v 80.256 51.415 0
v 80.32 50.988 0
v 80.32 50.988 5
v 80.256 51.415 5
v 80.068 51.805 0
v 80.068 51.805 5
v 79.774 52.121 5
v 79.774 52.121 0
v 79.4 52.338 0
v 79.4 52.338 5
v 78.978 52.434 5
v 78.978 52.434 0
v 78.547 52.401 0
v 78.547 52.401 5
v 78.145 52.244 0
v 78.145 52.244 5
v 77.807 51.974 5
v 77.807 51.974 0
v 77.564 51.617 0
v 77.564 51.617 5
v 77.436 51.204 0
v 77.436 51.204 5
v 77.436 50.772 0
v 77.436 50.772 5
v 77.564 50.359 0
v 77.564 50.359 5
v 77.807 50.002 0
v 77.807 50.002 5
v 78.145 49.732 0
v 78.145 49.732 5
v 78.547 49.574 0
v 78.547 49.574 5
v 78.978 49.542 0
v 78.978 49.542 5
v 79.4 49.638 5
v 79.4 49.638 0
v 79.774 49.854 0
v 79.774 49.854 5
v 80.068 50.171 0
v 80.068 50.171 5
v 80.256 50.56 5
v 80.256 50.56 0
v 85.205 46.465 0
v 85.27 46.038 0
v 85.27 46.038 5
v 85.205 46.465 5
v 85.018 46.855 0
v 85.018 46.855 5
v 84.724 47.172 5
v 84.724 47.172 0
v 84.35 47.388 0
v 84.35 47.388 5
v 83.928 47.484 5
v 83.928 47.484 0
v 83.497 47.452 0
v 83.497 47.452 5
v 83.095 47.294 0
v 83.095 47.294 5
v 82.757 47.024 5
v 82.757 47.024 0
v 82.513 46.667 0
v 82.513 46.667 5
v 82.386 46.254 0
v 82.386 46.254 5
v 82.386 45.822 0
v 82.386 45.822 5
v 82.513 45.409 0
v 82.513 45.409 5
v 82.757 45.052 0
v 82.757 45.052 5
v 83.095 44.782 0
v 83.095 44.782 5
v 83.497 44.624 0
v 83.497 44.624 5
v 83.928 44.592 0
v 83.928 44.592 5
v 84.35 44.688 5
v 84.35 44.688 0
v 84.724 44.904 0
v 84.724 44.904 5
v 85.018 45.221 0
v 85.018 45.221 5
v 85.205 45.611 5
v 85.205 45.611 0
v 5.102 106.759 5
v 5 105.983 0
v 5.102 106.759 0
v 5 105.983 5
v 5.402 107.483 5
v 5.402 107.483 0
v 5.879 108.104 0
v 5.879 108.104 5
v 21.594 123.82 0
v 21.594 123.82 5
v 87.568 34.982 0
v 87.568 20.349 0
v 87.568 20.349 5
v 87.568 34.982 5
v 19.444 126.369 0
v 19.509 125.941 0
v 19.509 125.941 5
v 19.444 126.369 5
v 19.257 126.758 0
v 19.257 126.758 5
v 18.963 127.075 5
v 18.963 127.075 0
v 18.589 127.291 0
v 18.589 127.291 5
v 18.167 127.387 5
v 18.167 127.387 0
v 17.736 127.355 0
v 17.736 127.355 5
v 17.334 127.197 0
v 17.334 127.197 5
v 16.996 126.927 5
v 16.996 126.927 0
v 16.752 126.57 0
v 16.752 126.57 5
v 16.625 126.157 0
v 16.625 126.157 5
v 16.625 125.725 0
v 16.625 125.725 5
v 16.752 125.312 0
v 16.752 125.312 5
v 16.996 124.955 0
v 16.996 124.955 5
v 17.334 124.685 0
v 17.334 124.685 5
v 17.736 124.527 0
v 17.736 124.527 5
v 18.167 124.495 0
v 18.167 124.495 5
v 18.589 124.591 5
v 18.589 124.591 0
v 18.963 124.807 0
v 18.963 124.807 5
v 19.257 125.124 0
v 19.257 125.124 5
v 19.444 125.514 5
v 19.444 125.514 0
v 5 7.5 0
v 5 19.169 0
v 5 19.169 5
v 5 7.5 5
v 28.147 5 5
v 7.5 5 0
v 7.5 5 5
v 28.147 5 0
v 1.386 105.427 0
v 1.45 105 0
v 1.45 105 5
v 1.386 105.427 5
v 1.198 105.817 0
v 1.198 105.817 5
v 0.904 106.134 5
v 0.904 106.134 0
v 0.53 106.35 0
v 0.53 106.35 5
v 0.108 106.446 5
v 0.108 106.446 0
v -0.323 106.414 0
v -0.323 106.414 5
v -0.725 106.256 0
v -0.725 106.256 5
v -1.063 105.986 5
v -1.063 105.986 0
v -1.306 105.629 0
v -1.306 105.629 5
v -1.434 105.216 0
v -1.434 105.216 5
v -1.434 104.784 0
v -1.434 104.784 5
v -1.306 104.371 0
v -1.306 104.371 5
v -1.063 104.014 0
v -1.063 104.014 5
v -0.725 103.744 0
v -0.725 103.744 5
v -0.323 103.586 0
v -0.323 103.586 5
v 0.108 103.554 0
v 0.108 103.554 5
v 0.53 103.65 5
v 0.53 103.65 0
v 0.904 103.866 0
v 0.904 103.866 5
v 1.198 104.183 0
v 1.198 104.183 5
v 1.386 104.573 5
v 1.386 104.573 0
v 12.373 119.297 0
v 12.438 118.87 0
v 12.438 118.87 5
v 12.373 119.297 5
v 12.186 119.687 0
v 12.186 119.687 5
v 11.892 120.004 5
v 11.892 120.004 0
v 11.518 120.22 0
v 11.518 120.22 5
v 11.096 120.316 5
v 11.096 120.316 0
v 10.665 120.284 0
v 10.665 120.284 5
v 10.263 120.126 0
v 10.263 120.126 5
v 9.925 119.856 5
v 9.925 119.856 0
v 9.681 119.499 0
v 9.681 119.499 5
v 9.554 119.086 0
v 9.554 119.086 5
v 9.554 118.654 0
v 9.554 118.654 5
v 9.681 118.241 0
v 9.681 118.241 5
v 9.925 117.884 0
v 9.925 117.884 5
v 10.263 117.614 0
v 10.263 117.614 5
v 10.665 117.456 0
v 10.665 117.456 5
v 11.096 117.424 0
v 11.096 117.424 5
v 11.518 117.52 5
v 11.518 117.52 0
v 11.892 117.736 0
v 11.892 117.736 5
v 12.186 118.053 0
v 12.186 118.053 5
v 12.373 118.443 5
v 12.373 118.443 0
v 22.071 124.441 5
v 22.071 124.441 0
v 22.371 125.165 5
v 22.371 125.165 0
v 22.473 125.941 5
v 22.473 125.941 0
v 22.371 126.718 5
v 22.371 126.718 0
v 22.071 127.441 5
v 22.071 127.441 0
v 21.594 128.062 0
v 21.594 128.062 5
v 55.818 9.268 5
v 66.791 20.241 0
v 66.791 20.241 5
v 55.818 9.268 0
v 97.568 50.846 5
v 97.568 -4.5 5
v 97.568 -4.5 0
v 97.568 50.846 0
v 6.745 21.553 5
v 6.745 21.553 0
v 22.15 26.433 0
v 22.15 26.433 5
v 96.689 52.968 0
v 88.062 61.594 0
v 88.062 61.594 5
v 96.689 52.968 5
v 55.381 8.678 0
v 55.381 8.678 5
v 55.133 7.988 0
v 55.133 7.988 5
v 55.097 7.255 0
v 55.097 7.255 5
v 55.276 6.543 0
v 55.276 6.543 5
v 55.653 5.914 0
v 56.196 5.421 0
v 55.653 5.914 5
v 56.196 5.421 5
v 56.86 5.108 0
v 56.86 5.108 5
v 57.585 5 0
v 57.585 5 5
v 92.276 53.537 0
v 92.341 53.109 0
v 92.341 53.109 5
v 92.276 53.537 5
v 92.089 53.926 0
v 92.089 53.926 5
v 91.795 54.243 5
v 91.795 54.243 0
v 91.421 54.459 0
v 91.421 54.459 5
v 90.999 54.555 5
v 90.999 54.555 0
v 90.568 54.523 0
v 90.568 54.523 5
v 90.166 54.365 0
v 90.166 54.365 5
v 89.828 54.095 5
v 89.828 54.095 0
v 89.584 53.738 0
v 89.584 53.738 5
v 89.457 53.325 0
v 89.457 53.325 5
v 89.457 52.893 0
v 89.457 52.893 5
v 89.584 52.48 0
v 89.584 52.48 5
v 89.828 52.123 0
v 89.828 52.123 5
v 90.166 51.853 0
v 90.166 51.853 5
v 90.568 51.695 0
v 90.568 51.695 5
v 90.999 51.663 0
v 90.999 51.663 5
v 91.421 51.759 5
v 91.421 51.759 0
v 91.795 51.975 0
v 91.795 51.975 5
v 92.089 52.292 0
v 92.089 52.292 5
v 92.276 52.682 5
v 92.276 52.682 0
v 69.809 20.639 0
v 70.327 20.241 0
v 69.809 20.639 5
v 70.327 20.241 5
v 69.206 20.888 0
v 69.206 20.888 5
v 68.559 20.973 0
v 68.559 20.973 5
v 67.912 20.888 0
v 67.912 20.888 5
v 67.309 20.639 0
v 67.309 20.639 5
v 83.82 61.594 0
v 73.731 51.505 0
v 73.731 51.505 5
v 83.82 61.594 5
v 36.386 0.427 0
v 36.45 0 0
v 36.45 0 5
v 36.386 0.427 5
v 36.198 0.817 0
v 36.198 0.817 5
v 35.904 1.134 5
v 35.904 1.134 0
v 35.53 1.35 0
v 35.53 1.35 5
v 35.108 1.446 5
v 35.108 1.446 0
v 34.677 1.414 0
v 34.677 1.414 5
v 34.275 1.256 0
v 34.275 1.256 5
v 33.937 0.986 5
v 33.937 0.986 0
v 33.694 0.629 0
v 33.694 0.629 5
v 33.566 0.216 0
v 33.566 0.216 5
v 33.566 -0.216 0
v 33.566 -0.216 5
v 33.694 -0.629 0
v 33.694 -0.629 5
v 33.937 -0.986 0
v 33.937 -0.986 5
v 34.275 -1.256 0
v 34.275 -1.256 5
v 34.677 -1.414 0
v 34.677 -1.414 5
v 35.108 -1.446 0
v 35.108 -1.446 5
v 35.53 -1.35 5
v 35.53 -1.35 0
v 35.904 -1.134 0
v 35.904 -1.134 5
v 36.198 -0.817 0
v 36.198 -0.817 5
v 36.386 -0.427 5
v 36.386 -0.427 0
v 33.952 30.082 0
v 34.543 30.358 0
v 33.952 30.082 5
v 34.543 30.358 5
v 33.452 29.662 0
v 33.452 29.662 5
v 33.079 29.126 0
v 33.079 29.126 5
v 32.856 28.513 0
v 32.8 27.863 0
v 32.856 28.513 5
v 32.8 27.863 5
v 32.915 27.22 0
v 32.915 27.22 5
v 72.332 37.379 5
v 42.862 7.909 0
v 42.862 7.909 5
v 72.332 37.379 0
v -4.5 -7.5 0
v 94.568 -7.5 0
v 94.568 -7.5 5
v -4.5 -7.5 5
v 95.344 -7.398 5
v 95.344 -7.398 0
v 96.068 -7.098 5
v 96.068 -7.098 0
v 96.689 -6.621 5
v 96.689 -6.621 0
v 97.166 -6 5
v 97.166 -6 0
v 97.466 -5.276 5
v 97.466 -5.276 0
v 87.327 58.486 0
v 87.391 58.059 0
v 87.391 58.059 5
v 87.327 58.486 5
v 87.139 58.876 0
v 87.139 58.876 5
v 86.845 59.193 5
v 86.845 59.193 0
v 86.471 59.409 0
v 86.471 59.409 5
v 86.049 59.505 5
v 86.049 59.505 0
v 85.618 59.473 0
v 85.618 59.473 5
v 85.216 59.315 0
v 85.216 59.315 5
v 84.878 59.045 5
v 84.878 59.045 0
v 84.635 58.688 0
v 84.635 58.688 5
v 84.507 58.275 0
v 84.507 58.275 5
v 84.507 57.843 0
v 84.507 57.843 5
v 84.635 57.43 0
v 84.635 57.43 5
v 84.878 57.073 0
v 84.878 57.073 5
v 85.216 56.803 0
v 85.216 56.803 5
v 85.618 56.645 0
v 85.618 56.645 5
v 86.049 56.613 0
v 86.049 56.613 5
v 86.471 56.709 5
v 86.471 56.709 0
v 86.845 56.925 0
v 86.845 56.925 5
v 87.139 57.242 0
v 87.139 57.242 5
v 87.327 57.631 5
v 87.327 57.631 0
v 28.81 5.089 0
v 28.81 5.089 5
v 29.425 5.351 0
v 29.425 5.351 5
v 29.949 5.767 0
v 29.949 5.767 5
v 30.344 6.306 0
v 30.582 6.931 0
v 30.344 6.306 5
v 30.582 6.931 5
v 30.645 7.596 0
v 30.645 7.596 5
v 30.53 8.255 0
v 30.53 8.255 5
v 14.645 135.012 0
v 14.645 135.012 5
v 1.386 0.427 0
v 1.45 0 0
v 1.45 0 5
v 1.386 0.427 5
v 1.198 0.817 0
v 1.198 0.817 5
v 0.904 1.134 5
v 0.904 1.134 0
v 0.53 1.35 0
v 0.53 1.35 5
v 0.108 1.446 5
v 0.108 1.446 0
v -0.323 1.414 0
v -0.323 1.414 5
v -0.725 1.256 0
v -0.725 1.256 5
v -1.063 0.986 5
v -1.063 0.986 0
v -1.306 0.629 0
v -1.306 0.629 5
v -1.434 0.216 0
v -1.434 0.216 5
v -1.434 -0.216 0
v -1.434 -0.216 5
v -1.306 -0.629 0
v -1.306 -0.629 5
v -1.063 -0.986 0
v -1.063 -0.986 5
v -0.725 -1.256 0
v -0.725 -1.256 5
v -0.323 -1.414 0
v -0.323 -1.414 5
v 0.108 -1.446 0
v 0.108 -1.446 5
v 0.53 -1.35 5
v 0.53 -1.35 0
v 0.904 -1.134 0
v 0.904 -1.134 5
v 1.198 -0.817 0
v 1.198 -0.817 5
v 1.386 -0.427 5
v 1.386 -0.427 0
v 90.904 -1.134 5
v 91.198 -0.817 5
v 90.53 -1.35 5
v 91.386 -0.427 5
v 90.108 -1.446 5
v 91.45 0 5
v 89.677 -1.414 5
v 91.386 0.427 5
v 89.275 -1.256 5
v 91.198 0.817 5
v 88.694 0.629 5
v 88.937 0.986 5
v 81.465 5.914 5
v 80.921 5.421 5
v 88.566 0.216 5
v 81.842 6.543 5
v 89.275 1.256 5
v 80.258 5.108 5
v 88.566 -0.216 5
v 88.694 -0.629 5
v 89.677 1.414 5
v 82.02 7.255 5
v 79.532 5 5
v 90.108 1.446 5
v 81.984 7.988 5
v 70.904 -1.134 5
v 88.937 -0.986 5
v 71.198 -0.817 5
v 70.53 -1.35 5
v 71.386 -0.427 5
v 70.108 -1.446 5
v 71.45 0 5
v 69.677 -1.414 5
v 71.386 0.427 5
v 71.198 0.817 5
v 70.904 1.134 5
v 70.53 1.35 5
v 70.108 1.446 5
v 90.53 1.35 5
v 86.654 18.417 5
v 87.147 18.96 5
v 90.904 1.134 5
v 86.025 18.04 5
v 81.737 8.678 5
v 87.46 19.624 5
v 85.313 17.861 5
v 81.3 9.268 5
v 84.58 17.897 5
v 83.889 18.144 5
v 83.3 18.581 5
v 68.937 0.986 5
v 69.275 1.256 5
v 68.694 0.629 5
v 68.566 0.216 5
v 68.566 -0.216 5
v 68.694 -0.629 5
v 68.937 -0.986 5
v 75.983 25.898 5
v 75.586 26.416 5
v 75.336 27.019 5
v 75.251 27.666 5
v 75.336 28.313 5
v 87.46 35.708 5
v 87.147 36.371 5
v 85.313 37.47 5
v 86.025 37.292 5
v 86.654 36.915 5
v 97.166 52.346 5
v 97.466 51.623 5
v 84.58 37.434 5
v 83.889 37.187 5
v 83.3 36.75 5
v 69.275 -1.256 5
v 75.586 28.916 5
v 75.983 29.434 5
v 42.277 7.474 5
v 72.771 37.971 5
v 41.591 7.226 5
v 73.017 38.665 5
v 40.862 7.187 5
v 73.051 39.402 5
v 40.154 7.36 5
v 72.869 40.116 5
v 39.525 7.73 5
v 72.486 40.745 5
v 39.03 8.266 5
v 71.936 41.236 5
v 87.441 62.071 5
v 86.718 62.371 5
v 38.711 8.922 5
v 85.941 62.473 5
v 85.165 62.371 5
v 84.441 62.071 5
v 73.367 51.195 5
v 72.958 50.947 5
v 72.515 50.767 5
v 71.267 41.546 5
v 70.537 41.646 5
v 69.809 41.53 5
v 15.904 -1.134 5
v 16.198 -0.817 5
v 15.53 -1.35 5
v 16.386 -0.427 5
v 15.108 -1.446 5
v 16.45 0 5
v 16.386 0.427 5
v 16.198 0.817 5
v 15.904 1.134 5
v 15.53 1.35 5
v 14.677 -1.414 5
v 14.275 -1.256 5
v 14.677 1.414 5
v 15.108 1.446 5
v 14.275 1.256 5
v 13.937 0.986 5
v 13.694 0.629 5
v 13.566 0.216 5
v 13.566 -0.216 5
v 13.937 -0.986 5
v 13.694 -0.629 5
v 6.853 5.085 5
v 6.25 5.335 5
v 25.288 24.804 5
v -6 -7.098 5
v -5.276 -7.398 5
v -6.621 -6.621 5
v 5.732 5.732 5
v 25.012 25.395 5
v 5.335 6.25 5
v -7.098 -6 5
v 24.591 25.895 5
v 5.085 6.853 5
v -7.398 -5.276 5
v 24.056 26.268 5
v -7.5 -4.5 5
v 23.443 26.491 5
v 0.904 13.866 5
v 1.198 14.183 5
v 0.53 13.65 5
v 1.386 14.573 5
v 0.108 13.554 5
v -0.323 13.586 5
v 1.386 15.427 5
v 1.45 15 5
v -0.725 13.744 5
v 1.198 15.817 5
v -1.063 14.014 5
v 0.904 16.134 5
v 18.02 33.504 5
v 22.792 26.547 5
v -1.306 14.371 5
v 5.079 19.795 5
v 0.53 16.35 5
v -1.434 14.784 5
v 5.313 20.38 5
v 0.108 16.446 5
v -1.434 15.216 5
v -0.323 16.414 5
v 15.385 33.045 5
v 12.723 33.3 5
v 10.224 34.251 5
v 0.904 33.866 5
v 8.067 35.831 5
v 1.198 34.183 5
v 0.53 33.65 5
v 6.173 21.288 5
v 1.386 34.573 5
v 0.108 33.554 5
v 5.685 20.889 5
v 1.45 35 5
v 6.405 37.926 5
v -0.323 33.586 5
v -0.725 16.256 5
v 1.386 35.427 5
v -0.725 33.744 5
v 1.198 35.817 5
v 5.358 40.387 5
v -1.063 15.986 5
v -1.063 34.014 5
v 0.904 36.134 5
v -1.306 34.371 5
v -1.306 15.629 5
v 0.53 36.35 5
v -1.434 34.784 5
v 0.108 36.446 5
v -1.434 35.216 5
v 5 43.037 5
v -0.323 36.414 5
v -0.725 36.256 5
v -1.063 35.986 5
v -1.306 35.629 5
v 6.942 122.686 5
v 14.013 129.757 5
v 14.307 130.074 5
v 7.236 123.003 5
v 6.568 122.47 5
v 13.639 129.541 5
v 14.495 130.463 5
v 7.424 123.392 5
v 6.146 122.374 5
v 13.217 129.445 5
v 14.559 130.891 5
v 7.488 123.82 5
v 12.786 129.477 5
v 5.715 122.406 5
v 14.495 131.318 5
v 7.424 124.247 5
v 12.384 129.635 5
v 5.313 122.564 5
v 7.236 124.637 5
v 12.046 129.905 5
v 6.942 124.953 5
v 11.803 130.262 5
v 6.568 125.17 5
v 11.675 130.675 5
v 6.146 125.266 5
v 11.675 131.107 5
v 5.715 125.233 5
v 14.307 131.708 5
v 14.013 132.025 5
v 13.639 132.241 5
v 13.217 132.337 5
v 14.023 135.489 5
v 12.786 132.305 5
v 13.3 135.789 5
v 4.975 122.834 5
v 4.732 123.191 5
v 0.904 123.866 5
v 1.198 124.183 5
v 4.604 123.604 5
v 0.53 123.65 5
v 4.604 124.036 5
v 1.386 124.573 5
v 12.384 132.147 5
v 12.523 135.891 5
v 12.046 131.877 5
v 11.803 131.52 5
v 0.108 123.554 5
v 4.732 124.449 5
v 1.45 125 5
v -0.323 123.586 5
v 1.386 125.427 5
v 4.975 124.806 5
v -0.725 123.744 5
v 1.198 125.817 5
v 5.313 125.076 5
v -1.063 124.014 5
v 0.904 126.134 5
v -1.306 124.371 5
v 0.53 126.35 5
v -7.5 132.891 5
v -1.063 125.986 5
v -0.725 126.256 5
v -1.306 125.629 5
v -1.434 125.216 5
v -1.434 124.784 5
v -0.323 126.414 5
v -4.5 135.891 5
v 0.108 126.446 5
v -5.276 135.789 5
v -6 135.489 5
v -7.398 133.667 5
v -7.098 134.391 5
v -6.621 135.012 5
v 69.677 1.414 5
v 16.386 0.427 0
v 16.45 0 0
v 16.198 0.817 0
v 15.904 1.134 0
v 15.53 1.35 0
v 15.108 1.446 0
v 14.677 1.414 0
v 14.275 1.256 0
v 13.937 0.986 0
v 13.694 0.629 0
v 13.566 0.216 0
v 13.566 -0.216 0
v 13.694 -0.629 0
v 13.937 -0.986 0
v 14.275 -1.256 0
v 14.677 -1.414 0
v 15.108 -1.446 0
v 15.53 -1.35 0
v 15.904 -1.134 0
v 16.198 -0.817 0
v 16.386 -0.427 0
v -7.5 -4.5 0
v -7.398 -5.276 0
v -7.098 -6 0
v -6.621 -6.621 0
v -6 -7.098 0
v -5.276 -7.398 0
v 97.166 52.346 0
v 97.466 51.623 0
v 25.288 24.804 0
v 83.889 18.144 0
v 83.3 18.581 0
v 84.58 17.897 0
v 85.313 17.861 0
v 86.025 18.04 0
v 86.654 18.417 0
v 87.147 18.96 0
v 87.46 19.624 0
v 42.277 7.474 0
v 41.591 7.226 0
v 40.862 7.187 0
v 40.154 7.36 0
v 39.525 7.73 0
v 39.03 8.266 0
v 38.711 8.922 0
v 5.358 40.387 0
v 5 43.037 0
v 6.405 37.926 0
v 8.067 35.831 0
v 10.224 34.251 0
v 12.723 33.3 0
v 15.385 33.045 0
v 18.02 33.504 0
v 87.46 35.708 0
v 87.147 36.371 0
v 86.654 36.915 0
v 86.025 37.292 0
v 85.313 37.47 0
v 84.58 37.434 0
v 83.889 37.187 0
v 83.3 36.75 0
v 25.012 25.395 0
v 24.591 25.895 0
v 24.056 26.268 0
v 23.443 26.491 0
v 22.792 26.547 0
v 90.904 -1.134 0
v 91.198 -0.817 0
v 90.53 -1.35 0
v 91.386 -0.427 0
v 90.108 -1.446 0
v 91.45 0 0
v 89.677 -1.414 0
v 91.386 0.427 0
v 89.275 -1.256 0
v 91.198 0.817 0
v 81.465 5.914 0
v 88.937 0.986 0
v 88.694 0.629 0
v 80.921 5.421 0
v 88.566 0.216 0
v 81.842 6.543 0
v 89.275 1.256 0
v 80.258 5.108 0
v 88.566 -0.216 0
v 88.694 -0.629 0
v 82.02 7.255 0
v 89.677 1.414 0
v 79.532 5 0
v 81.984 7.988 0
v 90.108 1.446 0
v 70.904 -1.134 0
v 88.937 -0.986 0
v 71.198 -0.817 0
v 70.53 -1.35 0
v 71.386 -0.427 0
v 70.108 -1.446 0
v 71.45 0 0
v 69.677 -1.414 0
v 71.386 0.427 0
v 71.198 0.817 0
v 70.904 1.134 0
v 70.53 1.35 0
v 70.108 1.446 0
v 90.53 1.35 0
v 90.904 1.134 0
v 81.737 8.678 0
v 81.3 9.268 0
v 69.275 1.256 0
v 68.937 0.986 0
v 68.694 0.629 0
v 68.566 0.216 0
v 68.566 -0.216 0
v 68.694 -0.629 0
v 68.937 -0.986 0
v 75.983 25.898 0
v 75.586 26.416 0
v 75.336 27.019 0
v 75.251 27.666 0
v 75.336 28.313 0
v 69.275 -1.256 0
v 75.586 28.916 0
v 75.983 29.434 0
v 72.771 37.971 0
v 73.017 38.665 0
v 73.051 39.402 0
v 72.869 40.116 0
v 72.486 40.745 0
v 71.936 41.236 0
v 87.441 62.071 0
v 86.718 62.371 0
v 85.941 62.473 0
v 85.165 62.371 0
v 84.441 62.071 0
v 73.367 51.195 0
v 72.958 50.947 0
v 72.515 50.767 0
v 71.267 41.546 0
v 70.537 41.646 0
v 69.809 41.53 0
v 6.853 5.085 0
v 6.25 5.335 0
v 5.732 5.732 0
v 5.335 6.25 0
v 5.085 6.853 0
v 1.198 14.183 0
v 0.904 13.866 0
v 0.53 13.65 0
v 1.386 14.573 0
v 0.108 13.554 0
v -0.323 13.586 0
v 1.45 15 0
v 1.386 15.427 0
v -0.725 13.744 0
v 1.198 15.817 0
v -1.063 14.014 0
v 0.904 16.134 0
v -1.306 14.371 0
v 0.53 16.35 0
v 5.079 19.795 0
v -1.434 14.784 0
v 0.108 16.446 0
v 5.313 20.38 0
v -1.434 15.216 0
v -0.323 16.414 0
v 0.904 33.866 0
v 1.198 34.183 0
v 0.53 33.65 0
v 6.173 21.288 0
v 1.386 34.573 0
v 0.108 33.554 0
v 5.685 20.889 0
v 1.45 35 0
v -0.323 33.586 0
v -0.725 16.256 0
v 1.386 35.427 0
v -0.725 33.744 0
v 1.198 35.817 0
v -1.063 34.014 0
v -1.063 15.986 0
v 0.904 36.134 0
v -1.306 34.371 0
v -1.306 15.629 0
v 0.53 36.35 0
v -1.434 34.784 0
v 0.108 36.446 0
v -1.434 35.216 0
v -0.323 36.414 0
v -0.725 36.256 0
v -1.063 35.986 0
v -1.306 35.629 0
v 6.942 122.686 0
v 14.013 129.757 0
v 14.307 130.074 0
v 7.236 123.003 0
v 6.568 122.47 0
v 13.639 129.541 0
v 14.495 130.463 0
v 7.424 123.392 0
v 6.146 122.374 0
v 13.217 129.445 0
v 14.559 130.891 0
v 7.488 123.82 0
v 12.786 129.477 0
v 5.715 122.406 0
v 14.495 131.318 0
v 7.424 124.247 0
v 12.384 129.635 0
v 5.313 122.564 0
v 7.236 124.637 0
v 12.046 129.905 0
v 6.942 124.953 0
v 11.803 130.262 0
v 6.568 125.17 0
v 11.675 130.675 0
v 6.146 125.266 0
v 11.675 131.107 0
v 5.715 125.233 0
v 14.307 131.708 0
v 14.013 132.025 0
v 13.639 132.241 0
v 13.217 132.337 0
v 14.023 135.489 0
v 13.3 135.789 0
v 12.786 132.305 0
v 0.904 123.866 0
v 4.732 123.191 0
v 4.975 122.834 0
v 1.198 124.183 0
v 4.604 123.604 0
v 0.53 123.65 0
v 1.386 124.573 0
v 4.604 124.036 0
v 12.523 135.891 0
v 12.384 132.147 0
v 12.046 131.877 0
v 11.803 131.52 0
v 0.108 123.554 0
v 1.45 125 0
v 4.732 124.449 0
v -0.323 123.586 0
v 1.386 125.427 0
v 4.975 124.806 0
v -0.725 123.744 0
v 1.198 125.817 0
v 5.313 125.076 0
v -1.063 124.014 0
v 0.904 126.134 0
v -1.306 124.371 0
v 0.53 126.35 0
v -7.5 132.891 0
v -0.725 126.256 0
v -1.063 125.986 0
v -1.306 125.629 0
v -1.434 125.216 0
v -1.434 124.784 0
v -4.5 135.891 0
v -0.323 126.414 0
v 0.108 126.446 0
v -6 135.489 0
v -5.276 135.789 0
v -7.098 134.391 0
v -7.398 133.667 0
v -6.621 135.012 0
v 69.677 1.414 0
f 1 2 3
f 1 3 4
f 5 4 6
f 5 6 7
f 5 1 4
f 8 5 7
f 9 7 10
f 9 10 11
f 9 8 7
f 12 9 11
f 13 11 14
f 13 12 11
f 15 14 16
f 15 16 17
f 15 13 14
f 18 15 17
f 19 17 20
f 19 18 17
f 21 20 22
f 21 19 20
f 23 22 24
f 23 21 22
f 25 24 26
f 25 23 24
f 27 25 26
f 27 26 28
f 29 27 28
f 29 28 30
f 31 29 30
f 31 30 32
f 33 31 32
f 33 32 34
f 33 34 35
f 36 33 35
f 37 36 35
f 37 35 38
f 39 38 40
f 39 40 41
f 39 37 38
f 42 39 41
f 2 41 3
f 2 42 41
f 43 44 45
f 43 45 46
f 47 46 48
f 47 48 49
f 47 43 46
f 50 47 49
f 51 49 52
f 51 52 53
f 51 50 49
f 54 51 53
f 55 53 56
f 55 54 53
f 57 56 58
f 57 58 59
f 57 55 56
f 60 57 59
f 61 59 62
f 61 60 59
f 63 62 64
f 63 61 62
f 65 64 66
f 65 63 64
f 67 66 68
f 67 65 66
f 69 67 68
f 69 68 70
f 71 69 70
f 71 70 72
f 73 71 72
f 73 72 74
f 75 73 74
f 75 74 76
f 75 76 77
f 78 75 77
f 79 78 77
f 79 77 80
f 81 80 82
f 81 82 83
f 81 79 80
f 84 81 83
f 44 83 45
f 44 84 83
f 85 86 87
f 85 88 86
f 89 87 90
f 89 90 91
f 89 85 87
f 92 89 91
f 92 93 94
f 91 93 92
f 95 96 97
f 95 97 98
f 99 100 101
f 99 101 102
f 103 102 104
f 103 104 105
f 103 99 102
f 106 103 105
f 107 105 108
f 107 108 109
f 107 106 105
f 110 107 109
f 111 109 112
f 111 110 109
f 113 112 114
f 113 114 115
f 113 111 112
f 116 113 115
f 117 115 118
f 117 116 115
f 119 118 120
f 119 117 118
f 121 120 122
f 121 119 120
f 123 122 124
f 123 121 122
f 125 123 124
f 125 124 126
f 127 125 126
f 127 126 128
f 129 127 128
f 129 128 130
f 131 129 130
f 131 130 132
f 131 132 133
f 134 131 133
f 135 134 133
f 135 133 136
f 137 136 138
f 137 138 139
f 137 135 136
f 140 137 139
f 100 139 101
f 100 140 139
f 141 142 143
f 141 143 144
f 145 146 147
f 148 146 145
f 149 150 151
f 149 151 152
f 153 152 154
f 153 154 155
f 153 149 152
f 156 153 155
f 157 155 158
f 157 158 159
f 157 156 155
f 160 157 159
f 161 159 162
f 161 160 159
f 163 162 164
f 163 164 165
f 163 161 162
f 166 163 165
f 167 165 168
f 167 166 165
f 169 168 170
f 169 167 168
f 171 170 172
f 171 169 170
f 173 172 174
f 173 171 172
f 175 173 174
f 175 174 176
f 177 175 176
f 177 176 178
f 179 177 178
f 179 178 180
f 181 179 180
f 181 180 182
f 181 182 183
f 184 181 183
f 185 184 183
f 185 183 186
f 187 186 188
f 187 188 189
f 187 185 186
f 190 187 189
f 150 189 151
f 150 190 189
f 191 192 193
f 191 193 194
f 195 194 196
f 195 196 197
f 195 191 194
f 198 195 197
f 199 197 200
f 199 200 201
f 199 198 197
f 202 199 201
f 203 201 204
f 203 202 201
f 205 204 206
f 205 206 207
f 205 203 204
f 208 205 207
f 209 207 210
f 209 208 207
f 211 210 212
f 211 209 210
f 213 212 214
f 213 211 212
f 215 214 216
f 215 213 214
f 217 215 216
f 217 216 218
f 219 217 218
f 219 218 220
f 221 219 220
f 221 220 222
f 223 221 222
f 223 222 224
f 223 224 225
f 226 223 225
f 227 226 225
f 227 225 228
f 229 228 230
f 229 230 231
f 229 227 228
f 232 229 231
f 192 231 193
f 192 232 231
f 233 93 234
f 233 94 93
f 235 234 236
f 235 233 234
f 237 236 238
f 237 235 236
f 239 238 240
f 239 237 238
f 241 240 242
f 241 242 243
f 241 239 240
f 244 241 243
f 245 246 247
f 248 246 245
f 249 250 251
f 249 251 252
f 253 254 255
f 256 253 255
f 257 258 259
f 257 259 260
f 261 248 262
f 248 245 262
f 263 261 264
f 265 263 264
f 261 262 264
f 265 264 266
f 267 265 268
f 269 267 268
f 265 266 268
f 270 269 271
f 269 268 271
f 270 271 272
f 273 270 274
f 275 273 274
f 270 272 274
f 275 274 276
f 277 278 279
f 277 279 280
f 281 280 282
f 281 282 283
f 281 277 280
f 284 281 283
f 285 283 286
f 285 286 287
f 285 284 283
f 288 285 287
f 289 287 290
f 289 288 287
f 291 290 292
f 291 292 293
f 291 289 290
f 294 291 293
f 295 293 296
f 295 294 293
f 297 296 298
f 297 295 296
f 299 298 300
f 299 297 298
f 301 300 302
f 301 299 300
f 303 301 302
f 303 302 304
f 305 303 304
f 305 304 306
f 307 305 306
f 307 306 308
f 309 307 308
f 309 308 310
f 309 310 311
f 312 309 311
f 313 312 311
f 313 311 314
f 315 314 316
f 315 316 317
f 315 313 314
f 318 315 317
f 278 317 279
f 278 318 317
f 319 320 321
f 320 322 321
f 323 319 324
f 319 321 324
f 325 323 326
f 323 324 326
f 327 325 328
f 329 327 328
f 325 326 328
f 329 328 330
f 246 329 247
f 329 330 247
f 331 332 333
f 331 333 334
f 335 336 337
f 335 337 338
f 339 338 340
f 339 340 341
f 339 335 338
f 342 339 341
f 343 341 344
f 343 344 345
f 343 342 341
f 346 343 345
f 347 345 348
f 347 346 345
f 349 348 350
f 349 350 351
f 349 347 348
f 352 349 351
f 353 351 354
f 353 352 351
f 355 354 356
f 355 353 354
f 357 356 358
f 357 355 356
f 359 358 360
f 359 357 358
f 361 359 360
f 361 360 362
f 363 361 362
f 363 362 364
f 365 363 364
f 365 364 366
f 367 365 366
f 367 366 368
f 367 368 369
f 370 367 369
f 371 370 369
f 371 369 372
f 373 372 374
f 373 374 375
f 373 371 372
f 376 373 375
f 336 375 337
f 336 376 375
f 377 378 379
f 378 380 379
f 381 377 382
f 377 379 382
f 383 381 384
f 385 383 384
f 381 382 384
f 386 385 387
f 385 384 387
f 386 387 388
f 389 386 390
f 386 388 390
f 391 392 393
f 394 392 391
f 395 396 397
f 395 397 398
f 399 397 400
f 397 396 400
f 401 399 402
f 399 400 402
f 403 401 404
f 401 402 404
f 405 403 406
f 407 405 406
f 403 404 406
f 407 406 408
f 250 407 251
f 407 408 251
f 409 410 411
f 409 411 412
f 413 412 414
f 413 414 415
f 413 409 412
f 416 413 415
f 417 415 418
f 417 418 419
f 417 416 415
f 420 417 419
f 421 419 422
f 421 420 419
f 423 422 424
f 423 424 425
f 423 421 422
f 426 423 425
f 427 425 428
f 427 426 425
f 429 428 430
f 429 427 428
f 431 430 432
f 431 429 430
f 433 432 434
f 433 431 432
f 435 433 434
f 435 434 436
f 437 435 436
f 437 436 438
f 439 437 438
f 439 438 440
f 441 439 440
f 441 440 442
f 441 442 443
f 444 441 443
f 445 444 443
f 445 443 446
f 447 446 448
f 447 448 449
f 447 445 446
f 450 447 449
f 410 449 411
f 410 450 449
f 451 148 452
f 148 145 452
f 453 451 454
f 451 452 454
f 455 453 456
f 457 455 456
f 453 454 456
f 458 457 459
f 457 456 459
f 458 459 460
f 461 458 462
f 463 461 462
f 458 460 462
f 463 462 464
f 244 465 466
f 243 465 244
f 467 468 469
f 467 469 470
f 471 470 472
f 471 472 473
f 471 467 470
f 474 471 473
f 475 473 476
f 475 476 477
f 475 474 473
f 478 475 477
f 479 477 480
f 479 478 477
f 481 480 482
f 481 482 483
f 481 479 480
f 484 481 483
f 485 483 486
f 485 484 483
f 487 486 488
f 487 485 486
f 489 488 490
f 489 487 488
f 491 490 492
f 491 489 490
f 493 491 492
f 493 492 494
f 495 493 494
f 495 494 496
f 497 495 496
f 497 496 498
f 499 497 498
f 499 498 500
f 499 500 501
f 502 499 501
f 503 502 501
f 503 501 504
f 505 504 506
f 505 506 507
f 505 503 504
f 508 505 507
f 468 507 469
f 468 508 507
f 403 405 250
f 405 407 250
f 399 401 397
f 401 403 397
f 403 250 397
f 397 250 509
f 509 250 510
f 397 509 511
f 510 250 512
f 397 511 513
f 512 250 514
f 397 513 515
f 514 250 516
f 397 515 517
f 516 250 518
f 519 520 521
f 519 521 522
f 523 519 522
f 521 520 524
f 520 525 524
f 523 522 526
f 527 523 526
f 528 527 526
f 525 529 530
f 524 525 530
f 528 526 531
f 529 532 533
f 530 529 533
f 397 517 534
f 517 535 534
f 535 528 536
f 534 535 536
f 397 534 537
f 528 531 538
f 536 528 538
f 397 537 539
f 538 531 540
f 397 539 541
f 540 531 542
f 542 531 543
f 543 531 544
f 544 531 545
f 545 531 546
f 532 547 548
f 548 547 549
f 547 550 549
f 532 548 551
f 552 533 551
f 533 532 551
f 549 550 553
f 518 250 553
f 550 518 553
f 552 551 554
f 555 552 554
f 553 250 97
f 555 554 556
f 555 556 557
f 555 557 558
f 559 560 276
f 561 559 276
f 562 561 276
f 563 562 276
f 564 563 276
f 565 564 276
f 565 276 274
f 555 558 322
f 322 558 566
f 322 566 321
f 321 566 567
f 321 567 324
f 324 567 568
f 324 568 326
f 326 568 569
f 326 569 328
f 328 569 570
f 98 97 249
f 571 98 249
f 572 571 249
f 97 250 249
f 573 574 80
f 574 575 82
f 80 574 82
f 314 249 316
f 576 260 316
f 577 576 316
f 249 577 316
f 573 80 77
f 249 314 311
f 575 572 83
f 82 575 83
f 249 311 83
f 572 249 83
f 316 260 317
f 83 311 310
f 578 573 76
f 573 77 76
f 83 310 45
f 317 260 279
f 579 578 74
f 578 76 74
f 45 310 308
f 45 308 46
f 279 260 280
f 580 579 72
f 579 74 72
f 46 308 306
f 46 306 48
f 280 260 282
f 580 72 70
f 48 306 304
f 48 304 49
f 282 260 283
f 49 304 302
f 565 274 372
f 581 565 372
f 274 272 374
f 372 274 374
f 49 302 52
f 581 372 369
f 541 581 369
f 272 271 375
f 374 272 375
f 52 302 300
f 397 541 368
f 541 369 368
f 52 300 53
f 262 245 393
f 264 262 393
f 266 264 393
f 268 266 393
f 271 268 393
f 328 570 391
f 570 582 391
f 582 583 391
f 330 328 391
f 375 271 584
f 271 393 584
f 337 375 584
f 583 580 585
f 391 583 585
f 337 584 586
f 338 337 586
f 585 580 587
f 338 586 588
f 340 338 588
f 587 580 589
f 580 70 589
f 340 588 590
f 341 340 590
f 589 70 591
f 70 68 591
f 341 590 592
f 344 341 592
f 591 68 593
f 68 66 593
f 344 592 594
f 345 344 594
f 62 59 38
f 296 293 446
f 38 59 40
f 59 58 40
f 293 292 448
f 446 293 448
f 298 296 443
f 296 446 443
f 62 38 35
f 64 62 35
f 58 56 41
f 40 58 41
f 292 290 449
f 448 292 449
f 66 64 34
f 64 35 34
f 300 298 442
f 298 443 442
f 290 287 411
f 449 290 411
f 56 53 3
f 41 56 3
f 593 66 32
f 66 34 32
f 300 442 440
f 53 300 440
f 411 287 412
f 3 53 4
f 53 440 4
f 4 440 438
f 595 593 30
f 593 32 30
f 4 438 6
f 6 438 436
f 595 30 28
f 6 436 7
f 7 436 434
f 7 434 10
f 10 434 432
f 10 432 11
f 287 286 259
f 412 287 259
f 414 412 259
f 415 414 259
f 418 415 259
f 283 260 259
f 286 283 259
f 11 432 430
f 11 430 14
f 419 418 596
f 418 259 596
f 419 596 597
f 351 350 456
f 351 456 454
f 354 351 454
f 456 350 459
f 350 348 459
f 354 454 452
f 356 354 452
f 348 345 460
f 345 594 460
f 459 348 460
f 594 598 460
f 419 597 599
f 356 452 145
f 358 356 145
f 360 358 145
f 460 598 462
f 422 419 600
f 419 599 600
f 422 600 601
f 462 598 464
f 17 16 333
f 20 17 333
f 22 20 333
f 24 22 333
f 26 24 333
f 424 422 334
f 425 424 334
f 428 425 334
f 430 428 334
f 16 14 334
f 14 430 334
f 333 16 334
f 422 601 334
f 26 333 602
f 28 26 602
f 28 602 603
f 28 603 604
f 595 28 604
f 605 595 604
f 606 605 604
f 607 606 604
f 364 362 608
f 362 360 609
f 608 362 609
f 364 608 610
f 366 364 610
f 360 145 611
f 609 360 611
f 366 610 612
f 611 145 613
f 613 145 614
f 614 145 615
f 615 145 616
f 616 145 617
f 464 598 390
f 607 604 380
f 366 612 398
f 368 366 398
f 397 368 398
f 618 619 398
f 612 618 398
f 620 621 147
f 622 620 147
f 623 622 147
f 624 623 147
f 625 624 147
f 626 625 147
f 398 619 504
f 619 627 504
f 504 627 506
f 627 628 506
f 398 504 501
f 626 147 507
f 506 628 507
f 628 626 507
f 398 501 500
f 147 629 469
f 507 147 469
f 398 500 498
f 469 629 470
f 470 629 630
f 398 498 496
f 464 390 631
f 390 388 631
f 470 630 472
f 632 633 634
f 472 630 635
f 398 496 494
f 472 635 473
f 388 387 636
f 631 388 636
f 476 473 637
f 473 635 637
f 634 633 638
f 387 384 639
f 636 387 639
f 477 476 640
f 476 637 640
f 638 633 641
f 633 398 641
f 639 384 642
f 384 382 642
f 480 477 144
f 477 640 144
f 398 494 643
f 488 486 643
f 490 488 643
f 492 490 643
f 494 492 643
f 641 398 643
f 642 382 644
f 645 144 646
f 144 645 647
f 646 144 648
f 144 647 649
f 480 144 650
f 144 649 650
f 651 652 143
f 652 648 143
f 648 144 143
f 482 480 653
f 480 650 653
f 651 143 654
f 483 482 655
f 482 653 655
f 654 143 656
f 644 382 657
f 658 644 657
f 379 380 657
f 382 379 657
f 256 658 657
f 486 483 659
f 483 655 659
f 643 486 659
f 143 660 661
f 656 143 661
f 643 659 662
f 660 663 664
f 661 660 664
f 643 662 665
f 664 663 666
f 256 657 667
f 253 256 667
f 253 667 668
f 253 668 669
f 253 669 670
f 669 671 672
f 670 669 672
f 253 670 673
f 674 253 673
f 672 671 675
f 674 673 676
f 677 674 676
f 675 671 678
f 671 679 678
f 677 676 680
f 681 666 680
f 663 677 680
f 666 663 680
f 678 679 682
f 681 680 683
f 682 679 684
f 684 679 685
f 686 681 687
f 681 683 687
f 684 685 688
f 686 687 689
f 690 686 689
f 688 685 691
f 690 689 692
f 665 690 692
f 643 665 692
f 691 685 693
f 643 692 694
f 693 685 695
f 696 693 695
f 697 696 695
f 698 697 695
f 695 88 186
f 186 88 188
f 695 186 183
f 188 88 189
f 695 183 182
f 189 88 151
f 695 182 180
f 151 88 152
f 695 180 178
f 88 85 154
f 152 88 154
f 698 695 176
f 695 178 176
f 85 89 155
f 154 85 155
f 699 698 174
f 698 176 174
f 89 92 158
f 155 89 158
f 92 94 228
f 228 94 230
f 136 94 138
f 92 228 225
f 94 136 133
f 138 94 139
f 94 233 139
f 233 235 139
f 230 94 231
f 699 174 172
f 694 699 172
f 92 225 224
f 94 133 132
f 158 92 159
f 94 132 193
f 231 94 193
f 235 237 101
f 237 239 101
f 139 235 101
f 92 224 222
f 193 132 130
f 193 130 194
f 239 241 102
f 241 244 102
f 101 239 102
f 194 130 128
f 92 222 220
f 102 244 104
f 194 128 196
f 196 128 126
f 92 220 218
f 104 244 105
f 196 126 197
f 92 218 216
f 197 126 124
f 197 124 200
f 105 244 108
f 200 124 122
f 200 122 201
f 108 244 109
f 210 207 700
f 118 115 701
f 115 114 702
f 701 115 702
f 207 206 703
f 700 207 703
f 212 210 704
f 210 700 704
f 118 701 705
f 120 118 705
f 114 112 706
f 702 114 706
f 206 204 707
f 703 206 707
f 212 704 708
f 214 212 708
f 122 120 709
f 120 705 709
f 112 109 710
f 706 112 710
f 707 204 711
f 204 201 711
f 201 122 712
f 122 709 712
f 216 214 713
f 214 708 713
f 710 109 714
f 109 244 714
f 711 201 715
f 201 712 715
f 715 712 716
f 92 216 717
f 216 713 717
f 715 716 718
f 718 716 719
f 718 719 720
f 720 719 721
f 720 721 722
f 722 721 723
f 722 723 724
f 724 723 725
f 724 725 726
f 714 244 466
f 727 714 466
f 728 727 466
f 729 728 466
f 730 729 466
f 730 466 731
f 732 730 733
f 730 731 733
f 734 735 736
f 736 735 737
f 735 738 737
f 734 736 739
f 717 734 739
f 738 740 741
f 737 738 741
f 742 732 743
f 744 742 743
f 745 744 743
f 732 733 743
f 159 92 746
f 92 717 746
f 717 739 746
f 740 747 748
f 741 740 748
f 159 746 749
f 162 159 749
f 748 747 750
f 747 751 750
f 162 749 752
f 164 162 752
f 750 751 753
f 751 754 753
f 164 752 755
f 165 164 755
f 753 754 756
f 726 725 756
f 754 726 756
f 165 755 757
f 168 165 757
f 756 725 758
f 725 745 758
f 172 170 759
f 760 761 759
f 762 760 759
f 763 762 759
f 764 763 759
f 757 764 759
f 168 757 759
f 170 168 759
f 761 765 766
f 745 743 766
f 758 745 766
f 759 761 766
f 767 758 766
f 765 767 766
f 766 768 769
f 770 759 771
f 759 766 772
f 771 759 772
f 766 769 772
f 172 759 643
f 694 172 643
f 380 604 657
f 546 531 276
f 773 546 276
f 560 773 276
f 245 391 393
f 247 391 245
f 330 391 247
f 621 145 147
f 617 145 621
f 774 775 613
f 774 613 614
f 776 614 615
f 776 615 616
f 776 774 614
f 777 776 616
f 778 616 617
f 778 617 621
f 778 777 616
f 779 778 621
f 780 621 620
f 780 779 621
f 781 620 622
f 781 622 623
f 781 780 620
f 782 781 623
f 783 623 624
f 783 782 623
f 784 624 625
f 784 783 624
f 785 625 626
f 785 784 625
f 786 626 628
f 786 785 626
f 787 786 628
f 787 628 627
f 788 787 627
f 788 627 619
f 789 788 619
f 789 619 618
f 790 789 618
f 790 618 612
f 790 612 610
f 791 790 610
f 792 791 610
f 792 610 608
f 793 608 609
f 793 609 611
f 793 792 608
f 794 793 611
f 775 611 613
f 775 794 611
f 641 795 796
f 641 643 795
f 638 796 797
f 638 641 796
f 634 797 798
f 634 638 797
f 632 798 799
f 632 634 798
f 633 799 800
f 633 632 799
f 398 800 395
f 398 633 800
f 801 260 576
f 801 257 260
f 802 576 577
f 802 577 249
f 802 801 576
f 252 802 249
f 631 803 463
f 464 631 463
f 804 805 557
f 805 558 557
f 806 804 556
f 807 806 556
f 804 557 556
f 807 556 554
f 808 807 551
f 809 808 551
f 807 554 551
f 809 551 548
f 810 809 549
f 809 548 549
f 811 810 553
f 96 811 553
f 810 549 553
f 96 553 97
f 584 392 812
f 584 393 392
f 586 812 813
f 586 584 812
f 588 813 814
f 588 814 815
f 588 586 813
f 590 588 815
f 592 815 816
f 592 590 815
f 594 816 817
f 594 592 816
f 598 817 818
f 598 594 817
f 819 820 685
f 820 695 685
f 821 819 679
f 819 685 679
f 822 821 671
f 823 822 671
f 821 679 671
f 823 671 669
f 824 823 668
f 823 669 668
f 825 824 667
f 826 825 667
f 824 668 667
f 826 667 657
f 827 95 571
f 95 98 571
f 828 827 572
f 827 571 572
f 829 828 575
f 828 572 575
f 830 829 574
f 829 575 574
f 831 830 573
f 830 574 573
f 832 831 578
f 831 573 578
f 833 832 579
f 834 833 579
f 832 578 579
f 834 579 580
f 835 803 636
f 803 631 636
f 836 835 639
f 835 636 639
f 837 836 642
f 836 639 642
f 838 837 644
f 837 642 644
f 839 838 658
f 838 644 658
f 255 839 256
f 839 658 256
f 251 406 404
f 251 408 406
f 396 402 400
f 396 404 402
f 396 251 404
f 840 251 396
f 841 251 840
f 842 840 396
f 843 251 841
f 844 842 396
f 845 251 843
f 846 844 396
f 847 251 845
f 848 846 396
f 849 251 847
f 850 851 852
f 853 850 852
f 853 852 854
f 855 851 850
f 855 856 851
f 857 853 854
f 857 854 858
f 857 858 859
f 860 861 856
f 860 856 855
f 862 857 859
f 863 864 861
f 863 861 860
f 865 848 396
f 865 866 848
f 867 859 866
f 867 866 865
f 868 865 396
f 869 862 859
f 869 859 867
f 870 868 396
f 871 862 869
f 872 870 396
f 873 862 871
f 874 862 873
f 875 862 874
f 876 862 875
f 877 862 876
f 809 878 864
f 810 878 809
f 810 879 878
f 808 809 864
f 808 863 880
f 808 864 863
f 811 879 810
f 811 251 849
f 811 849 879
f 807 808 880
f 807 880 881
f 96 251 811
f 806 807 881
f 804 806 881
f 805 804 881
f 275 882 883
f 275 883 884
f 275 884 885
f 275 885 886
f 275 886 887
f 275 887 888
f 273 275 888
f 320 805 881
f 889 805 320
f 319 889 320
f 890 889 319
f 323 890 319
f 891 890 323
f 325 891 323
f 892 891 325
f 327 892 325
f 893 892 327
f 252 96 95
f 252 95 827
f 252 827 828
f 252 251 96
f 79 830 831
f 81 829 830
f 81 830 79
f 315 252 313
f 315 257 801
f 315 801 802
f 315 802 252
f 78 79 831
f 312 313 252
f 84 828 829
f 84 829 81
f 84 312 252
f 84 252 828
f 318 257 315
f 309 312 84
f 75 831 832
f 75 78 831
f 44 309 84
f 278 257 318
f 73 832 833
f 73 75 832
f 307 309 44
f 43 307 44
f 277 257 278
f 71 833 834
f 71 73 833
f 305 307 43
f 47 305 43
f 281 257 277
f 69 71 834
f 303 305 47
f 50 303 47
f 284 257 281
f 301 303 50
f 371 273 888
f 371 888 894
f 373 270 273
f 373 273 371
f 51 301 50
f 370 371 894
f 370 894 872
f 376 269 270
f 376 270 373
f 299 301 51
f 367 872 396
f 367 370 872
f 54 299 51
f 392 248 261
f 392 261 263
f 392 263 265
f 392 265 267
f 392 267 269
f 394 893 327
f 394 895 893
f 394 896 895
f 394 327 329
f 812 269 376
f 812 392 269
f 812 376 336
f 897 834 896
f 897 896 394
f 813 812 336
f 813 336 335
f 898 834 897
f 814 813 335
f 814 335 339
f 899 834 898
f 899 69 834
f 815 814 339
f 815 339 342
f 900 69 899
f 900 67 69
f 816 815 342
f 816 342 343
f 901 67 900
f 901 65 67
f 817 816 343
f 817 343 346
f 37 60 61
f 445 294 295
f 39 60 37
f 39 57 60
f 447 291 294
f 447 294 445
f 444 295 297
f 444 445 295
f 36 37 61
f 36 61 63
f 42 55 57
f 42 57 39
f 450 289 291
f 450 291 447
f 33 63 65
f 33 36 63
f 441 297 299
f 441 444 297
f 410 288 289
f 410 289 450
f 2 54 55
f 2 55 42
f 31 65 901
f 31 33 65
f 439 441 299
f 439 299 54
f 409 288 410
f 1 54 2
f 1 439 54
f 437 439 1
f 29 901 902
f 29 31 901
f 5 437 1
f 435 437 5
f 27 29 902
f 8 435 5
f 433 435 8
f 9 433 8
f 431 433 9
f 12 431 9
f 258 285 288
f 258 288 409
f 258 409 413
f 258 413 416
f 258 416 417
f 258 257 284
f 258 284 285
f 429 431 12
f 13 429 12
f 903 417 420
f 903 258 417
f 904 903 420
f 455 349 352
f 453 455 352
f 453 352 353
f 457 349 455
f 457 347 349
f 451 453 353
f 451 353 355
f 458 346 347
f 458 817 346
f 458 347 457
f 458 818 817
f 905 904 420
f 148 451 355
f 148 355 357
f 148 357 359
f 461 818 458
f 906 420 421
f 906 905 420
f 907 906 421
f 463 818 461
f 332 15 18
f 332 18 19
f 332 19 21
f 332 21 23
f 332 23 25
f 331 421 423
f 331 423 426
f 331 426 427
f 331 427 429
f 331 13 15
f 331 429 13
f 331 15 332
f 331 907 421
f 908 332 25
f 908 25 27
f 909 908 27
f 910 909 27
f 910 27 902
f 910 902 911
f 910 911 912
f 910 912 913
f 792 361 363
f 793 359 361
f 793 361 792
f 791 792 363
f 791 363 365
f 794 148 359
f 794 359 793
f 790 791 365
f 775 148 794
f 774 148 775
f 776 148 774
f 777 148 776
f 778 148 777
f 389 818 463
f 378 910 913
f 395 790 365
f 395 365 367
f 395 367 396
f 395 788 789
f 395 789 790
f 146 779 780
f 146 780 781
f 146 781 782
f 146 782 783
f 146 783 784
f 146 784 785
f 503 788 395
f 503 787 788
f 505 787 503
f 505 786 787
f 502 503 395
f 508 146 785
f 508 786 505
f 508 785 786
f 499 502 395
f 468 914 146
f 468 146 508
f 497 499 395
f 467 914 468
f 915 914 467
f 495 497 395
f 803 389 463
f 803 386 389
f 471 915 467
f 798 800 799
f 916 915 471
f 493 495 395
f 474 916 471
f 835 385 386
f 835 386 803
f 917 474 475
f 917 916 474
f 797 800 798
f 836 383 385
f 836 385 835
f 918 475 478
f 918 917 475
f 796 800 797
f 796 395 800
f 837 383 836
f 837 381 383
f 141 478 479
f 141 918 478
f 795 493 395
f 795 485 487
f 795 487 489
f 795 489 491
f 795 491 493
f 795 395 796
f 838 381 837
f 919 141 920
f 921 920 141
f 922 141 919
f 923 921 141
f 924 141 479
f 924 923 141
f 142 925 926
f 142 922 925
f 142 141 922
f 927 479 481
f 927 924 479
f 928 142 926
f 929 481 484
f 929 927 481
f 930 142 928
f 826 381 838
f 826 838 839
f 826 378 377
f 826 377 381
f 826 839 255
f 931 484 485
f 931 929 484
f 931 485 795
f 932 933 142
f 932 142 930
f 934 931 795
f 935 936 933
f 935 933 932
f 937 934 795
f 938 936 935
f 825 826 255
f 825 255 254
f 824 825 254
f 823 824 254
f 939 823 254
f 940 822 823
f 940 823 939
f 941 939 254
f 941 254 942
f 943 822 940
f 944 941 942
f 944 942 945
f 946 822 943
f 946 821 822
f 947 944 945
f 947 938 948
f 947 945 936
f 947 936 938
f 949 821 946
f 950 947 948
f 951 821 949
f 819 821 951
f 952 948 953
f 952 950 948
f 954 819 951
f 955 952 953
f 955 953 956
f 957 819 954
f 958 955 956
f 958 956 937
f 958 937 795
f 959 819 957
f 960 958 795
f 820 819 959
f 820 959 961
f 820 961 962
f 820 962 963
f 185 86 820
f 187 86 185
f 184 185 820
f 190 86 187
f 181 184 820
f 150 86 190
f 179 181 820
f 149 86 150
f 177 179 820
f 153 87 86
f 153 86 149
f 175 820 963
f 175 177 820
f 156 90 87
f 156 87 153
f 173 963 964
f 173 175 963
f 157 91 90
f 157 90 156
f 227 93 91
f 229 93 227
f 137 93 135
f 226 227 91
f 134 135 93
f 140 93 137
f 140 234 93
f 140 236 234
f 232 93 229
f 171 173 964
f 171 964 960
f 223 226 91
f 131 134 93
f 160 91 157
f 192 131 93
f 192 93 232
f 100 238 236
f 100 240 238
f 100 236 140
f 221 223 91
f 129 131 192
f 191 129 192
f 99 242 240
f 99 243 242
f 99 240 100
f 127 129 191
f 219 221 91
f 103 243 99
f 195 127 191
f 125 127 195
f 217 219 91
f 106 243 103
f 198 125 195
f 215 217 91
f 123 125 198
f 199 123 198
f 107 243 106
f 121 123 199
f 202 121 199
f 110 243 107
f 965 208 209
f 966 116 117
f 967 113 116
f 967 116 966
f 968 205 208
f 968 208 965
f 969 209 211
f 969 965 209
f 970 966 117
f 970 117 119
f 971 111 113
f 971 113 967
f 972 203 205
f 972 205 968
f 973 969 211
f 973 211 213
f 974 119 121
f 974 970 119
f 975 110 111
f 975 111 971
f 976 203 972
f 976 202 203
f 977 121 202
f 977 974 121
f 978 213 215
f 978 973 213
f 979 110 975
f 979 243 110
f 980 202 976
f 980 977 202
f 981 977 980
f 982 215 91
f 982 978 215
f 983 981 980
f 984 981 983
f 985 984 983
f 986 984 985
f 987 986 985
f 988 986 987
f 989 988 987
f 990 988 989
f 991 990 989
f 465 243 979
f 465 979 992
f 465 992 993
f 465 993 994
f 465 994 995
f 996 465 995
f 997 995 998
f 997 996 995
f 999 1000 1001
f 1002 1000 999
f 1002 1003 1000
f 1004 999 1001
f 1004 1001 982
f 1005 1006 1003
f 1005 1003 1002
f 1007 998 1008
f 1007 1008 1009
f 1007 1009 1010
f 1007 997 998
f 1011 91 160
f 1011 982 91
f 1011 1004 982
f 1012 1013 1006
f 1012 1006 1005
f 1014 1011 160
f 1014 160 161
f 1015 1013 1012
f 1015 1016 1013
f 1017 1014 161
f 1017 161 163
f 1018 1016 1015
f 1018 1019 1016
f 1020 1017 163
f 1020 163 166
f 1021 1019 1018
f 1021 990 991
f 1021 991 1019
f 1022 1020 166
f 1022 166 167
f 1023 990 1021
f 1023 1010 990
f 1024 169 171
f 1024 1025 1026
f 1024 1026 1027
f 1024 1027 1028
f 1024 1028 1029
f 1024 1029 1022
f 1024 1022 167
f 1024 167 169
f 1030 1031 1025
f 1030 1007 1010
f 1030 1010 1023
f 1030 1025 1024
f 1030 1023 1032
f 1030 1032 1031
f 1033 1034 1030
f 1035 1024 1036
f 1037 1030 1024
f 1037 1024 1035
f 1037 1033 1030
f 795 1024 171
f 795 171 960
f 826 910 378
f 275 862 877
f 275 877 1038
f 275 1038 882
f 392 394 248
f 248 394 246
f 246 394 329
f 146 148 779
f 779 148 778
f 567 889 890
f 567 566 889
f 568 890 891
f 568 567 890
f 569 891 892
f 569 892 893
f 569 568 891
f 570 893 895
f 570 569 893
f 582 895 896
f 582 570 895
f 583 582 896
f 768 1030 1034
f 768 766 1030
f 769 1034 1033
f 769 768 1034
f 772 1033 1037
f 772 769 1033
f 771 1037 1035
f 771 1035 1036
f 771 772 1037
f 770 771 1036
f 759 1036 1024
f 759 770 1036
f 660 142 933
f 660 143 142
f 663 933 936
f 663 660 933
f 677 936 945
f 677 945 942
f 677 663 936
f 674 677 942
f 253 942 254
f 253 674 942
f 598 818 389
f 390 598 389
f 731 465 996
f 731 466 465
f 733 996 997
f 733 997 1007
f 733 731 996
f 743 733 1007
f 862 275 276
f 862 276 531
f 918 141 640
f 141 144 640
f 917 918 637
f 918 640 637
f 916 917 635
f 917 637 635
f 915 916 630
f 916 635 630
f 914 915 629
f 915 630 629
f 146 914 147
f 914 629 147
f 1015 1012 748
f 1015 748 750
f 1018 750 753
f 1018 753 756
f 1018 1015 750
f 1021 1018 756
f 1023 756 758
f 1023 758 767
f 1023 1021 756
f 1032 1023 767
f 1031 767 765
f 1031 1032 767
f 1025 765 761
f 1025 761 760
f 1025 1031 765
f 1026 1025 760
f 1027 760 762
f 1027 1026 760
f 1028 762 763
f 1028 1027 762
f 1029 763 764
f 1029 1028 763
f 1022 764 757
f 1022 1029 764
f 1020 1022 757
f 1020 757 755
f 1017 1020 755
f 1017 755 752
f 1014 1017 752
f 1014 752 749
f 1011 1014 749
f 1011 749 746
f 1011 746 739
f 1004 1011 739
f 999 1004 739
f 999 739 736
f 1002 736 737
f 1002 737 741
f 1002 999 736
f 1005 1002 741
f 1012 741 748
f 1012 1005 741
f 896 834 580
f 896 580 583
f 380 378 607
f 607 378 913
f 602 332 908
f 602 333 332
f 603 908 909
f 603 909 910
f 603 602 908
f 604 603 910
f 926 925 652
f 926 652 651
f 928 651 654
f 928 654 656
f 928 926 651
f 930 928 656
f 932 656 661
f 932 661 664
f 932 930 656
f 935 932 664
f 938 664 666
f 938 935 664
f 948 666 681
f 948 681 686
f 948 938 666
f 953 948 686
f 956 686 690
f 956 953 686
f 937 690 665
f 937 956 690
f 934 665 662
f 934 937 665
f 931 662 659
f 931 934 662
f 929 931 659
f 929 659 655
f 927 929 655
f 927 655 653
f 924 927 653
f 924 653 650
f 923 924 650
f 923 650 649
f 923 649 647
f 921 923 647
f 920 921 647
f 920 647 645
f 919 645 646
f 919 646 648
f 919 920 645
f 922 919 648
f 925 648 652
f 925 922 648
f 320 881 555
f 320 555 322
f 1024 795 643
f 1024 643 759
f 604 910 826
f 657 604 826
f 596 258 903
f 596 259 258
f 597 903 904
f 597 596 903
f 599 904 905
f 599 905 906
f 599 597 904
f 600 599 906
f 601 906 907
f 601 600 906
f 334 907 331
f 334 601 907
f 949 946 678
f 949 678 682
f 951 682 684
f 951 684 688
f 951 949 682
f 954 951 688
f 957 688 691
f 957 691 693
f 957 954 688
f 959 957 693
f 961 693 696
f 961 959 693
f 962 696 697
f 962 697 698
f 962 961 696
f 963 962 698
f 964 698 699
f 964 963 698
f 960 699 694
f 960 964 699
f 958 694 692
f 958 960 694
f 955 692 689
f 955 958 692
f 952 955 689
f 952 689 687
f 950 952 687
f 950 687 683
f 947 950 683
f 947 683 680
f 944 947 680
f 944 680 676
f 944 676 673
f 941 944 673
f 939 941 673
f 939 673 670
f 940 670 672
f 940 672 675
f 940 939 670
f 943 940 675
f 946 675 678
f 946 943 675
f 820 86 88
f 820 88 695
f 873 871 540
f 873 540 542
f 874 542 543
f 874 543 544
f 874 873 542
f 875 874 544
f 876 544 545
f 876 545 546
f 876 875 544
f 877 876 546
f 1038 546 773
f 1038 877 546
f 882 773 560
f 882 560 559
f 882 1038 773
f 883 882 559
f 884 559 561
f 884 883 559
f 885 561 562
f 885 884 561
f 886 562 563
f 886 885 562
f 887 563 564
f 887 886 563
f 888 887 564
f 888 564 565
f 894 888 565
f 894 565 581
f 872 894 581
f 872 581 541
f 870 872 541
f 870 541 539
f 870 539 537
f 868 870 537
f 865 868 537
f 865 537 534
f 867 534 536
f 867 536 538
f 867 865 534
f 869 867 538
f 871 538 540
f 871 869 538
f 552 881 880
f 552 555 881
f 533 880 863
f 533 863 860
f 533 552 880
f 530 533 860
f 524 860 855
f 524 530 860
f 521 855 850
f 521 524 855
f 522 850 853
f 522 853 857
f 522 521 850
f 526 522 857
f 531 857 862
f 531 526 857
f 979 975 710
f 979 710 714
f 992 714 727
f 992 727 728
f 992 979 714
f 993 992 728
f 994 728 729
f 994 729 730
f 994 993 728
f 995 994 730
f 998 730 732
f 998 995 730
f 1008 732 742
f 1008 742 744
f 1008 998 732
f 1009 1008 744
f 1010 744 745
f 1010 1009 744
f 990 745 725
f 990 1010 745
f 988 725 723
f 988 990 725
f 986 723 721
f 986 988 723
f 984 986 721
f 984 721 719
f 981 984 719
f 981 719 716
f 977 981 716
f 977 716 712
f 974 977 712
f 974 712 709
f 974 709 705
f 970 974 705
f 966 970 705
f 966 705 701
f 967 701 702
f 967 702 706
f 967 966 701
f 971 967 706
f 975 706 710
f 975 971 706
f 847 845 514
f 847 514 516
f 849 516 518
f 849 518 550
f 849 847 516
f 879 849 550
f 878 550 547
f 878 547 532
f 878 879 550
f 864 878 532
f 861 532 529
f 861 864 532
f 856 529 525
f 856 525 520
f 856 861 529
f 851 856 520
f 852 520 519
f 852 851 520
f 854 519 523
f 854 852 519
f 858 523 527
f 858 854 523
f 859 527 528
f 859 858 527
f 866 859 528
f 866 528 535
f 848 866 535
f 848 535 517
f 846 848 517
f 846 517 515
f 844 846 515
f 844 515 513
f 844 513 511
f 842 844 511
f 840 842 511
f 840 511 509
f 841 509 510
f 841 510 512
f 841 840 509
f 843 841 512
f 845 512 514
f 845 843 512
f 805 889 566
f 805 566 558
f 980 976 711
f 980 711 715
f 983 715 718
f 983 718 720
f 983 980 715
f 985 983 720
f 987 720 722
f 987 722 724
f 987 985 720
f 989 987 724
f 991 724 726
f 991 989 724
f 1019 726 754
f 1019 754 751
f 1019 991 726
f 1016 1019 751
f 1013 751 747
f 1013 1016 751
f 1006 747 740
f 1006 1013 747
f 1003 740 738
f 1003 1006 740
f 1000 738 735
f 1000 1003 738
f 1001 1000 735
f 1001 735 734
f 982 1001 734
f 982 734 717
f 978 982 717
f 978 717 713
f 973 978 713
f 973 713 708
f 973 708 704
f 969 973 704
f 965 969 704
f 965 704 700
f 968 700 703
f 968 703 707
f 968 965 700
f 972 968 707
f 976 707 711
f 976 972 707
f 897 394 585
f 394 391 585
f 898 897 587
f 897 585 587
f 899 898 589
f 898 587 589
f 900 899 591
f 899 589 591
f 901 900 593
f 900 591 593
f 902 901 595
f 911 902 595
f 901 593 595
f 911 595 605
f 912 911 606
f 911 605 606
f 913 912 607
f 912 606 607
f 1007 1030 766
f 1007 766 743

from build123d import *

# Parameters (mm, degrees)
SKETCH_1_R          = 1.45
EXTRUDE_1_DEPTH     = 5
EXTRUDE_2_DEPTH     = 5
FILLET_1_R          = 10
FILLET_2_R          = 2.5
CUT_EXTRUDE_1_DEPTH = 183.793945183
FILLET_3_R          = 3


with BuildPart() as part:
    # 草图1 → 凸台-拉伸1 (new body)
    with BuildSketch(Plane.XY):
        Polygon((-7.5, -7.5), (-7.5, 135.890872965), (13.765981284, 135.890872965), (23.715728753, 125.941125497), (5, 107.225396744), (5, 5), (39.953318806, 5), (79.577164466, 44.623845661), (73.213203436, 50.987806691), (85.941125497, 63.715728753), (122.156854249, 27.5), (122.156854249, -7.5), align=None)
        Circle(SKETCH_1_R, mode=Mode.SUBTRACT)
        with Locations((0, 15)):
            Circle(SKETCH_1_R, mode=Mode.SUBTRACT)
        with Locations((0, 35)):
            Circle(SKETCH_1_R, mode=Mode.SUBTRACT)
        with Locations((15, 0)):
            Circle(SKETCH_1_R, mode=Mode.SUBTRACT)
        with Locations((35, 0)):
            Circle(SKETCH_1_R, mode=Mode.SUBTRACT)
        with Locations((18.058874503, 125.941125497)):
            Circle(SKETCH_1_R, mode=Mode.SUBTRACT)
        with Locations((13.109127035, 130.890872965)):
            Circle(SKETCH_1_R, mode=Mode.SUBTRACT)
        with Locations((6.038059223, 123.819805153)):
            Circle(SKETCH_1_R, mode=Mode.SUBTRACT)
        with Locations((10.987806691, 118.870057685)):
            Circle(SKETCH_1_R, mode=Mode.SUBTRACT)
        with Locations((90.890872965, 53.109127035)):
            Circle(SKETCH_1_R, mode=Mode.SUBTRACT)
        with Locations((85.941125497, 58.058874503)):
            Circle(SKETCH_1_R, mode=Mode.SUBTRACT)
        with Locations((78.870057685, 50.987806691)):
            Circle(SKETCH_1_R, mode=Mode.SUBTRACT)
        with Locations((83.819805153, 46.038059223)):
            Circle(SKETCH_1_R, mode=Mode.SUBTRACT)
        with Locations((0, 125)):
            Circle(SKETCH_1_R, mode=Mode.SUBTRACT)
        with Locations((0, 105)):
            Circle(SKETCH_1_R, mode=Mode.SUBTRACT)
        with Locations((70, 0)):
            Circle(SKETCH_1_R, mode=Mode.SUBTRACT)
        with Locations((90, 0)):
            Circle(SKETCH_1_R, mode=Mode.SUBTRACT)
        Polygon((94.567828227, 48.01795821), (51.549870017, 5), (115.156854249, 5), (115.156854249, 27.428932188), align=None, mode=Mode.SUBTRACT)
    extrude(amount=EXTRUDE_1_DEPTH)

    # 草图3 → 凸台-拉伸2 (add)
    with BuildSketch(Plane.XY):
        Polygon((97.567828227, 45.01795821), (97.567828227, 5), (85.567828227, 5), (68.558849122, 22.008979105), (74.215703372, 27.665833355), (87.567828227, 14.313708499), (87.567828227, 41.01795821), (94.567828227, 48.01795821), align=None)
        Polygon((73.213203436, 50.987806691), (5, 29.379876147), (5, 21), (24.533181149, 27.187535555), (31.561537876, 5), (39.953318806, 5), (32.159691009, 29.603388895), (79.577164466, 44.623845661), align=None)
    extrude(amount=EXTRUDE_2_DEPTH)

    # 圆角1
    fillet_1_edges = [part.edges().sort_by_distance(p)[0] for p in [
        (5, 29.379876147, 2.5),
    ]]
    fillet(fillet_1_edges, radius=FILLET_1_R)

    # 圆角2
    fillet_2_edges = [part.edges().sort_by_distance(p)[0] for p in [
        (97.567828227, 5, 2.5),
        (85.567828227, 5, 2.5),
        (68.558849122, 22.008979105, 2.5),
        (74.215703372, 27.665833355, 2.5),
        (87.567828227, 14.313708499, 2.5),
        (87.567828227, 41.01795821, 2.5),
        (97.567828227, 45.01795821, 2.5),
        (32.159691009, 29.603388895, 2.5),
        (31.561537876, 5, 2.5),
        (24.533181149, 27.187535555, 2.5),
        (5, 21, 2.5),
        (5, 5, 2.5),
        (39.953318806, 5, 2.5),
        (79.577164466, 44.623845661, 2.5),
        (115.156854249, 27.428932188, 2.5),
        (51.549870017, 5, 2.5),
        (115.156854249, 5, 2.5),
    ]]
    fillet(fillet_2_edges, radius=FILLET_2_R)

    # 草图4 → 切除-拉伸1 (cut, through all)
    with BuildSketch(Plane.XY.offset(5)):
        Polygon((97.567828227, -7.5), (97.567828227, 52.089026022), (122.156854249, 27.5), (122.156854249, -7.5), align=None)
    extrude(amount=-CUT_EXTRUDE_1_DEPTH, mode=Mode.SUBTRACT)

    # 圆角3
    fillet_3_edges = [part.edges().sort_by_distance(p)[0] for p in [
        (-7.5, -7.5, 2.5),
        (-7.5, 135.890872965, 2.5),
        (13.765981284, 135.890872965, 2.5),
        (23.715728753, 125.941125497, 2.5),
        (5, 107.225396744, 2.5),
        (73.213203436, 50.987806691, 2.5),
        (85.941125497, 63.715728753, 2.5),
        (97.567828227, -7.5, 2.5),
        (97.567828227, 52.089026022, 2.5),
    ]]
    fillet(fillet_3_edges, radius=FILLET_3_R)


solid = part.part
